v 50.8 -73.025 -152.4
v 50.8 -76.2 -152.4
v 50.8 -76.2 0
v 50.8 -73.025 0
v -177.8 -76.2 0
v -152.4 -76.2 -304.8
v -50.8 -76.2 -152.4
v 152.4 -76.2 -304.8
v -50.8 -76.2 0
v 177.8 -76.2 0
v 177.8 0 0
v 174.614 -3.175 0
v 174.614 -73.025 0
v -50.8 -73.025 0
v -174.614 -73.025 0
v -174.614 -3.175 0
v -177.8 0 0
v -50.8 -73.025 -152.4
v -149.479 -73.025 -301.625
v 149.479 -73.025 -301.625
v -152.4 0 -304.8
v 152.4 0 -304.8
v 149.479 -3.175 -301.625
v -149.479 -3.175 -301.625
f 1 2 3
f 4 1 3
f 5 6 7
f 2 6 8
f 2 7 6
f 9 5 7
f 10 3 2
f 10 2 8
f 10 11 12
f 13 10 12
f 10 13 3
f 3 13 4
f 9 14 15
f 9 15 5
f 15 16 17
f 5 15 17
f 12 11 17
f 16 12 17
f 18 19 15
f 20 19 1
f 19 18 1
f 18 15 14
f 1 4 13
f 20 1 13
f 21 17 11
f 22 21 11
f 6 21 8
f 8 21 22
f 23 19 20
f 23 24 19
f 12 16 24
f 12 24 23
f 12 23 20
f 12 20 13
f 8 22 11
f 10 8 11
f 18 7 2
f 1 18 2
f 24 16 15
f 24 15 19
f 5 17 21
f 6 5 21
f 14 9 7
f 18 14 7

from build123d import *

# Parameters (mm, degrees)
F1_DEPTH = 76.2
F2_T     = -3.175
F3_W     = 50.8
F3_H     = 76.2
F4_DEPTH = 25.4


with BuildPart() as f1:
    # F0 (on Front) → F1 (new body)
    with BuildSketch(Plane.XZ):
        Polygon((177.8, 0), (0, 0), (-177.8, 0), (-152.4, -304.8), (0, -304.8), (152.4, -304.8), align=None)
    extrude(amount=F1_DEPTH)

    # F2
    f2_openings = [f1.faces().sort_by_distance(p)[0] for p in [
        (0, -38.1, 0),
    ]]
    offset(amount=F2_T, openings=f2_openings)

    # F3 (on face) → F4 (cut)
    with BuildSketch(Plane.XZ.offset(76.2)):
        with Locations((-25.4, -114.3)):
            Rectangle(F3_W, F3_H)
        with Locations((-25.4, -38.1)):
            Rectangle(F3_W, F3_H)
        with Locations((25.4, -38.1)):
            Rectangle(F3_W, F3_H)
        with Locations((25.4, -114.3)):
            Rectangle(F3_W, F3_H)
    extrude(amount=-F4_DEPTH, mode=Mode.SUBTRACT)


solid = f1.part
